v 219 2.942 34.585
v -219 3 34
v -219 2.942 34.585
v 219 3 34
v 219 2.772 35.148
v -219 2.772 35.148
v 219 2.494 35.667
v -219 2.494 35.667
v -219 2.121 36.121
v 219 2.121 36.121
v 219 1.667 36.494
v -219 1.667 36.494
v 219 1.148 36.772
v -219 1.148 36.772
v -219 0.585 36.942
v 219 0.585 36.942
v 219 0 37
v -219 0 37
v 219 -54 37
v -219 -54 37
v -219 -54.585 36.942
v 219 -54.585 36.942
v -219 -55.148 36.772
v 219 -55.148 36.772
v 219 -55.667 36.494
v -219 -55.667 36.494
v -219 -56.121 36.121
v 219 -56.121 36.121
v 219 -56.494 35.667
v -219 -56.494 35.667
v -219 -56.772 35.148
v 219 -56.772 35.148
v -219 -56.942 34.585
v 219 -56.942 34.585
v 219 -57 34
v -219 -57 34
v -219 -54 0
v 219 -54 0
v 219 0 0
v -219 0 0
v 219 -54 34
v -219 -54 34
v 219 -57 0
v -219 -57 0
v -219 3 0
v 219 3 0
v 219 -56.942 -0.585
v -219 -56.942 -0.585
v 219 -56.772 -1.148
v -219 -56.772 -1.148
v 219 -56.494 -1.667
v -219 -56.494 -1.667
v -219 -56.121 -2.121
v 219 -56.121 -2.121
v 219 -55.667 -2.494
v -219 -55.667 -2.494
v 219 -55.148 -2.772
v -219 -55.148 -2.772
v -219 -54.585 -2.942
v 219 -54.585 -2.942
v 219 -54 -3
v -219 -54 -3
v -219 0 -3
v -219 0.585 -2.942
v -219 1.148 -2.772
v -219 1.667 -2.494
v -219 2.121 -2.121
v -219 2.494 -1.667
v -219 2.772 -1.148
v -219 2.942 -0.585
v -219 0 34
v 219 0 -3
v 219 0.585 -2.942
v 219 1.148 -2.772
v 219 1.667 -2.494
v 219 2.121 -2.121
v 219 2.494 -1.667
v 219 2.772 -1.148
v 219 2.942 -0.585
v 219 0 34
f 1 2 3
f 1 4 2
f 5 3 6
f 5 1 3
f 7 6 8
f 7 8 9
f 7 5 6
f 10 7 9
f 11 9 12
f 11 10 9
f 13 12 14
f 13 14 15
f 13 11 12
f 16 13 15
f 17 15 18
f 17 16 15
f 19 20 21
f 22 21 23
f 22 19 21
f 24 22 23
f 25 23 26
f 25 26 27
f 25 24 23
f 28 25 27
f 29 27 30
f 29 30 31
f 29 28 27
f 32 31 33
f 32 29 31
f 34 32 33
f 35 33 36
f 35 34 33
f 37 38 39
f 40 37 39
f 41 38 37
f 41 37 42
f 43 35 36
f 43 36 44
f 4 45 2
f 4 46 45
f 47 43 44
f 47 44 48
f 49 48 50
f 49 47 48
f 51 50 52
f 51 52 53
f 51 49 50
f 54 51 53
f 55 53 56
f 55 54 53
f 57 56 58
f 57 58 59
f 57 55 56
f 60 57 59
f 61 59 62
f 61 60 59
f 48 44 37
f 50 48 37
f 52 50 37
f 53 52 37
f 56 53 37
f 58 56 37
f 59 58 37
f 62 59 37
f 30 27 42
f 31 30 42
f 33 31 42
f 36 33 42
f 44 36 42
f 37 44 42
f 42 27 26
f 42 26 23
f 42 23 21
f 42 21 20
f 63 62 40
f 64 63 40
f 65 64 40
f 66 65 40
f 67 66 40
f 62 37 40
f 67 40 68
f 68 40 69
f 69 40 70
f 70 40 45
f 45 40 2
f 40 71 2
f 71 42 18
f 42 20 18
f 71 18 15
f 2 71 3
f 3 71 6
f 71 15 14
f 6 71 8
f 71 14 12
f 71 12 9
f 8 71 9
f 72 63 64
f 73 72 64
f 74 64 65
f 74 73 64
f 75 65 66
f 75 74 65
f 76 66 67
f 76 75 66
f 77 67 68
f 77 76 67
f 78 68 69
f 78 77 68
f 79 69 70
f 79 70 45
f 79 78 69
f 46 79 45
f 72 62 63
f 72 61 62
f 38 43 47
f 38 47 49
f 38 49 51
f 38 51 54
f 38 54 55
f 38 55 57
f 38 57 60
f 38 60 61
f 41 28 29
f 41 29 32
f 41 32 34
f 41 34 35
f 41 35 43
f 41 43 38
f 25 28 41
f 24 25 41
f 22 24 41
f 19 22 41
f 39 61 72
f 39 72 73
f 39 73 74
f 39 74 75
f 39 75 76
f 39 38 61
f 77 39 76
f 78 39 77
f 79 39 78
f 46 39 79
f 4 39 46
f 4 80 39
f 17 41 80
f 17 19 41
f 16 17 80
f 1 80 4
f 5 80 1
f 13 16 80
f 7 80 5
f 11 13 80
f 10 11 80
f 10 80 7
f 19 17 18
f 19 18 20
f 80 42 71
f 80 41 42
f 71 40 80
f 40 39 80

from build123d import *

# Parameters (mm, degrees)
F0_W     = 54
F0_H     = 34
F1_DEPTH = 219


with BuildPart() as f1:
    # F0 (on Right) → F1 (new body, symmetric)
    with BuildSketch(Plane.YZ):
        with BuildLine():
            ThreePointArc((3, 34), (2.12132, 36.12132), (0, 37))
            Line((0, 37), (-54, 37))
            ThreePointArc((-54, 37), (-56.12132, 36.12132), (-57, 34))
            Line((-57, 34), (-57, 0))
            ThreePointArc((-57, 0), (-56.12132, -2.12132), (-54, -3))
            Line((-54, -3), (0, -3))
            ThreePointArc((0, -3), (2.12132, -2.12132), (3, 0))
            Line((3, 0), (3, 34))
        make_face()
        with Locations((-27, 17)):
            Rectangle(F0_W, F0_H, mode=Mode.SUBTRACT)
    extrude(amount=F1_DEPTH, both=True)


solid = f1.part
